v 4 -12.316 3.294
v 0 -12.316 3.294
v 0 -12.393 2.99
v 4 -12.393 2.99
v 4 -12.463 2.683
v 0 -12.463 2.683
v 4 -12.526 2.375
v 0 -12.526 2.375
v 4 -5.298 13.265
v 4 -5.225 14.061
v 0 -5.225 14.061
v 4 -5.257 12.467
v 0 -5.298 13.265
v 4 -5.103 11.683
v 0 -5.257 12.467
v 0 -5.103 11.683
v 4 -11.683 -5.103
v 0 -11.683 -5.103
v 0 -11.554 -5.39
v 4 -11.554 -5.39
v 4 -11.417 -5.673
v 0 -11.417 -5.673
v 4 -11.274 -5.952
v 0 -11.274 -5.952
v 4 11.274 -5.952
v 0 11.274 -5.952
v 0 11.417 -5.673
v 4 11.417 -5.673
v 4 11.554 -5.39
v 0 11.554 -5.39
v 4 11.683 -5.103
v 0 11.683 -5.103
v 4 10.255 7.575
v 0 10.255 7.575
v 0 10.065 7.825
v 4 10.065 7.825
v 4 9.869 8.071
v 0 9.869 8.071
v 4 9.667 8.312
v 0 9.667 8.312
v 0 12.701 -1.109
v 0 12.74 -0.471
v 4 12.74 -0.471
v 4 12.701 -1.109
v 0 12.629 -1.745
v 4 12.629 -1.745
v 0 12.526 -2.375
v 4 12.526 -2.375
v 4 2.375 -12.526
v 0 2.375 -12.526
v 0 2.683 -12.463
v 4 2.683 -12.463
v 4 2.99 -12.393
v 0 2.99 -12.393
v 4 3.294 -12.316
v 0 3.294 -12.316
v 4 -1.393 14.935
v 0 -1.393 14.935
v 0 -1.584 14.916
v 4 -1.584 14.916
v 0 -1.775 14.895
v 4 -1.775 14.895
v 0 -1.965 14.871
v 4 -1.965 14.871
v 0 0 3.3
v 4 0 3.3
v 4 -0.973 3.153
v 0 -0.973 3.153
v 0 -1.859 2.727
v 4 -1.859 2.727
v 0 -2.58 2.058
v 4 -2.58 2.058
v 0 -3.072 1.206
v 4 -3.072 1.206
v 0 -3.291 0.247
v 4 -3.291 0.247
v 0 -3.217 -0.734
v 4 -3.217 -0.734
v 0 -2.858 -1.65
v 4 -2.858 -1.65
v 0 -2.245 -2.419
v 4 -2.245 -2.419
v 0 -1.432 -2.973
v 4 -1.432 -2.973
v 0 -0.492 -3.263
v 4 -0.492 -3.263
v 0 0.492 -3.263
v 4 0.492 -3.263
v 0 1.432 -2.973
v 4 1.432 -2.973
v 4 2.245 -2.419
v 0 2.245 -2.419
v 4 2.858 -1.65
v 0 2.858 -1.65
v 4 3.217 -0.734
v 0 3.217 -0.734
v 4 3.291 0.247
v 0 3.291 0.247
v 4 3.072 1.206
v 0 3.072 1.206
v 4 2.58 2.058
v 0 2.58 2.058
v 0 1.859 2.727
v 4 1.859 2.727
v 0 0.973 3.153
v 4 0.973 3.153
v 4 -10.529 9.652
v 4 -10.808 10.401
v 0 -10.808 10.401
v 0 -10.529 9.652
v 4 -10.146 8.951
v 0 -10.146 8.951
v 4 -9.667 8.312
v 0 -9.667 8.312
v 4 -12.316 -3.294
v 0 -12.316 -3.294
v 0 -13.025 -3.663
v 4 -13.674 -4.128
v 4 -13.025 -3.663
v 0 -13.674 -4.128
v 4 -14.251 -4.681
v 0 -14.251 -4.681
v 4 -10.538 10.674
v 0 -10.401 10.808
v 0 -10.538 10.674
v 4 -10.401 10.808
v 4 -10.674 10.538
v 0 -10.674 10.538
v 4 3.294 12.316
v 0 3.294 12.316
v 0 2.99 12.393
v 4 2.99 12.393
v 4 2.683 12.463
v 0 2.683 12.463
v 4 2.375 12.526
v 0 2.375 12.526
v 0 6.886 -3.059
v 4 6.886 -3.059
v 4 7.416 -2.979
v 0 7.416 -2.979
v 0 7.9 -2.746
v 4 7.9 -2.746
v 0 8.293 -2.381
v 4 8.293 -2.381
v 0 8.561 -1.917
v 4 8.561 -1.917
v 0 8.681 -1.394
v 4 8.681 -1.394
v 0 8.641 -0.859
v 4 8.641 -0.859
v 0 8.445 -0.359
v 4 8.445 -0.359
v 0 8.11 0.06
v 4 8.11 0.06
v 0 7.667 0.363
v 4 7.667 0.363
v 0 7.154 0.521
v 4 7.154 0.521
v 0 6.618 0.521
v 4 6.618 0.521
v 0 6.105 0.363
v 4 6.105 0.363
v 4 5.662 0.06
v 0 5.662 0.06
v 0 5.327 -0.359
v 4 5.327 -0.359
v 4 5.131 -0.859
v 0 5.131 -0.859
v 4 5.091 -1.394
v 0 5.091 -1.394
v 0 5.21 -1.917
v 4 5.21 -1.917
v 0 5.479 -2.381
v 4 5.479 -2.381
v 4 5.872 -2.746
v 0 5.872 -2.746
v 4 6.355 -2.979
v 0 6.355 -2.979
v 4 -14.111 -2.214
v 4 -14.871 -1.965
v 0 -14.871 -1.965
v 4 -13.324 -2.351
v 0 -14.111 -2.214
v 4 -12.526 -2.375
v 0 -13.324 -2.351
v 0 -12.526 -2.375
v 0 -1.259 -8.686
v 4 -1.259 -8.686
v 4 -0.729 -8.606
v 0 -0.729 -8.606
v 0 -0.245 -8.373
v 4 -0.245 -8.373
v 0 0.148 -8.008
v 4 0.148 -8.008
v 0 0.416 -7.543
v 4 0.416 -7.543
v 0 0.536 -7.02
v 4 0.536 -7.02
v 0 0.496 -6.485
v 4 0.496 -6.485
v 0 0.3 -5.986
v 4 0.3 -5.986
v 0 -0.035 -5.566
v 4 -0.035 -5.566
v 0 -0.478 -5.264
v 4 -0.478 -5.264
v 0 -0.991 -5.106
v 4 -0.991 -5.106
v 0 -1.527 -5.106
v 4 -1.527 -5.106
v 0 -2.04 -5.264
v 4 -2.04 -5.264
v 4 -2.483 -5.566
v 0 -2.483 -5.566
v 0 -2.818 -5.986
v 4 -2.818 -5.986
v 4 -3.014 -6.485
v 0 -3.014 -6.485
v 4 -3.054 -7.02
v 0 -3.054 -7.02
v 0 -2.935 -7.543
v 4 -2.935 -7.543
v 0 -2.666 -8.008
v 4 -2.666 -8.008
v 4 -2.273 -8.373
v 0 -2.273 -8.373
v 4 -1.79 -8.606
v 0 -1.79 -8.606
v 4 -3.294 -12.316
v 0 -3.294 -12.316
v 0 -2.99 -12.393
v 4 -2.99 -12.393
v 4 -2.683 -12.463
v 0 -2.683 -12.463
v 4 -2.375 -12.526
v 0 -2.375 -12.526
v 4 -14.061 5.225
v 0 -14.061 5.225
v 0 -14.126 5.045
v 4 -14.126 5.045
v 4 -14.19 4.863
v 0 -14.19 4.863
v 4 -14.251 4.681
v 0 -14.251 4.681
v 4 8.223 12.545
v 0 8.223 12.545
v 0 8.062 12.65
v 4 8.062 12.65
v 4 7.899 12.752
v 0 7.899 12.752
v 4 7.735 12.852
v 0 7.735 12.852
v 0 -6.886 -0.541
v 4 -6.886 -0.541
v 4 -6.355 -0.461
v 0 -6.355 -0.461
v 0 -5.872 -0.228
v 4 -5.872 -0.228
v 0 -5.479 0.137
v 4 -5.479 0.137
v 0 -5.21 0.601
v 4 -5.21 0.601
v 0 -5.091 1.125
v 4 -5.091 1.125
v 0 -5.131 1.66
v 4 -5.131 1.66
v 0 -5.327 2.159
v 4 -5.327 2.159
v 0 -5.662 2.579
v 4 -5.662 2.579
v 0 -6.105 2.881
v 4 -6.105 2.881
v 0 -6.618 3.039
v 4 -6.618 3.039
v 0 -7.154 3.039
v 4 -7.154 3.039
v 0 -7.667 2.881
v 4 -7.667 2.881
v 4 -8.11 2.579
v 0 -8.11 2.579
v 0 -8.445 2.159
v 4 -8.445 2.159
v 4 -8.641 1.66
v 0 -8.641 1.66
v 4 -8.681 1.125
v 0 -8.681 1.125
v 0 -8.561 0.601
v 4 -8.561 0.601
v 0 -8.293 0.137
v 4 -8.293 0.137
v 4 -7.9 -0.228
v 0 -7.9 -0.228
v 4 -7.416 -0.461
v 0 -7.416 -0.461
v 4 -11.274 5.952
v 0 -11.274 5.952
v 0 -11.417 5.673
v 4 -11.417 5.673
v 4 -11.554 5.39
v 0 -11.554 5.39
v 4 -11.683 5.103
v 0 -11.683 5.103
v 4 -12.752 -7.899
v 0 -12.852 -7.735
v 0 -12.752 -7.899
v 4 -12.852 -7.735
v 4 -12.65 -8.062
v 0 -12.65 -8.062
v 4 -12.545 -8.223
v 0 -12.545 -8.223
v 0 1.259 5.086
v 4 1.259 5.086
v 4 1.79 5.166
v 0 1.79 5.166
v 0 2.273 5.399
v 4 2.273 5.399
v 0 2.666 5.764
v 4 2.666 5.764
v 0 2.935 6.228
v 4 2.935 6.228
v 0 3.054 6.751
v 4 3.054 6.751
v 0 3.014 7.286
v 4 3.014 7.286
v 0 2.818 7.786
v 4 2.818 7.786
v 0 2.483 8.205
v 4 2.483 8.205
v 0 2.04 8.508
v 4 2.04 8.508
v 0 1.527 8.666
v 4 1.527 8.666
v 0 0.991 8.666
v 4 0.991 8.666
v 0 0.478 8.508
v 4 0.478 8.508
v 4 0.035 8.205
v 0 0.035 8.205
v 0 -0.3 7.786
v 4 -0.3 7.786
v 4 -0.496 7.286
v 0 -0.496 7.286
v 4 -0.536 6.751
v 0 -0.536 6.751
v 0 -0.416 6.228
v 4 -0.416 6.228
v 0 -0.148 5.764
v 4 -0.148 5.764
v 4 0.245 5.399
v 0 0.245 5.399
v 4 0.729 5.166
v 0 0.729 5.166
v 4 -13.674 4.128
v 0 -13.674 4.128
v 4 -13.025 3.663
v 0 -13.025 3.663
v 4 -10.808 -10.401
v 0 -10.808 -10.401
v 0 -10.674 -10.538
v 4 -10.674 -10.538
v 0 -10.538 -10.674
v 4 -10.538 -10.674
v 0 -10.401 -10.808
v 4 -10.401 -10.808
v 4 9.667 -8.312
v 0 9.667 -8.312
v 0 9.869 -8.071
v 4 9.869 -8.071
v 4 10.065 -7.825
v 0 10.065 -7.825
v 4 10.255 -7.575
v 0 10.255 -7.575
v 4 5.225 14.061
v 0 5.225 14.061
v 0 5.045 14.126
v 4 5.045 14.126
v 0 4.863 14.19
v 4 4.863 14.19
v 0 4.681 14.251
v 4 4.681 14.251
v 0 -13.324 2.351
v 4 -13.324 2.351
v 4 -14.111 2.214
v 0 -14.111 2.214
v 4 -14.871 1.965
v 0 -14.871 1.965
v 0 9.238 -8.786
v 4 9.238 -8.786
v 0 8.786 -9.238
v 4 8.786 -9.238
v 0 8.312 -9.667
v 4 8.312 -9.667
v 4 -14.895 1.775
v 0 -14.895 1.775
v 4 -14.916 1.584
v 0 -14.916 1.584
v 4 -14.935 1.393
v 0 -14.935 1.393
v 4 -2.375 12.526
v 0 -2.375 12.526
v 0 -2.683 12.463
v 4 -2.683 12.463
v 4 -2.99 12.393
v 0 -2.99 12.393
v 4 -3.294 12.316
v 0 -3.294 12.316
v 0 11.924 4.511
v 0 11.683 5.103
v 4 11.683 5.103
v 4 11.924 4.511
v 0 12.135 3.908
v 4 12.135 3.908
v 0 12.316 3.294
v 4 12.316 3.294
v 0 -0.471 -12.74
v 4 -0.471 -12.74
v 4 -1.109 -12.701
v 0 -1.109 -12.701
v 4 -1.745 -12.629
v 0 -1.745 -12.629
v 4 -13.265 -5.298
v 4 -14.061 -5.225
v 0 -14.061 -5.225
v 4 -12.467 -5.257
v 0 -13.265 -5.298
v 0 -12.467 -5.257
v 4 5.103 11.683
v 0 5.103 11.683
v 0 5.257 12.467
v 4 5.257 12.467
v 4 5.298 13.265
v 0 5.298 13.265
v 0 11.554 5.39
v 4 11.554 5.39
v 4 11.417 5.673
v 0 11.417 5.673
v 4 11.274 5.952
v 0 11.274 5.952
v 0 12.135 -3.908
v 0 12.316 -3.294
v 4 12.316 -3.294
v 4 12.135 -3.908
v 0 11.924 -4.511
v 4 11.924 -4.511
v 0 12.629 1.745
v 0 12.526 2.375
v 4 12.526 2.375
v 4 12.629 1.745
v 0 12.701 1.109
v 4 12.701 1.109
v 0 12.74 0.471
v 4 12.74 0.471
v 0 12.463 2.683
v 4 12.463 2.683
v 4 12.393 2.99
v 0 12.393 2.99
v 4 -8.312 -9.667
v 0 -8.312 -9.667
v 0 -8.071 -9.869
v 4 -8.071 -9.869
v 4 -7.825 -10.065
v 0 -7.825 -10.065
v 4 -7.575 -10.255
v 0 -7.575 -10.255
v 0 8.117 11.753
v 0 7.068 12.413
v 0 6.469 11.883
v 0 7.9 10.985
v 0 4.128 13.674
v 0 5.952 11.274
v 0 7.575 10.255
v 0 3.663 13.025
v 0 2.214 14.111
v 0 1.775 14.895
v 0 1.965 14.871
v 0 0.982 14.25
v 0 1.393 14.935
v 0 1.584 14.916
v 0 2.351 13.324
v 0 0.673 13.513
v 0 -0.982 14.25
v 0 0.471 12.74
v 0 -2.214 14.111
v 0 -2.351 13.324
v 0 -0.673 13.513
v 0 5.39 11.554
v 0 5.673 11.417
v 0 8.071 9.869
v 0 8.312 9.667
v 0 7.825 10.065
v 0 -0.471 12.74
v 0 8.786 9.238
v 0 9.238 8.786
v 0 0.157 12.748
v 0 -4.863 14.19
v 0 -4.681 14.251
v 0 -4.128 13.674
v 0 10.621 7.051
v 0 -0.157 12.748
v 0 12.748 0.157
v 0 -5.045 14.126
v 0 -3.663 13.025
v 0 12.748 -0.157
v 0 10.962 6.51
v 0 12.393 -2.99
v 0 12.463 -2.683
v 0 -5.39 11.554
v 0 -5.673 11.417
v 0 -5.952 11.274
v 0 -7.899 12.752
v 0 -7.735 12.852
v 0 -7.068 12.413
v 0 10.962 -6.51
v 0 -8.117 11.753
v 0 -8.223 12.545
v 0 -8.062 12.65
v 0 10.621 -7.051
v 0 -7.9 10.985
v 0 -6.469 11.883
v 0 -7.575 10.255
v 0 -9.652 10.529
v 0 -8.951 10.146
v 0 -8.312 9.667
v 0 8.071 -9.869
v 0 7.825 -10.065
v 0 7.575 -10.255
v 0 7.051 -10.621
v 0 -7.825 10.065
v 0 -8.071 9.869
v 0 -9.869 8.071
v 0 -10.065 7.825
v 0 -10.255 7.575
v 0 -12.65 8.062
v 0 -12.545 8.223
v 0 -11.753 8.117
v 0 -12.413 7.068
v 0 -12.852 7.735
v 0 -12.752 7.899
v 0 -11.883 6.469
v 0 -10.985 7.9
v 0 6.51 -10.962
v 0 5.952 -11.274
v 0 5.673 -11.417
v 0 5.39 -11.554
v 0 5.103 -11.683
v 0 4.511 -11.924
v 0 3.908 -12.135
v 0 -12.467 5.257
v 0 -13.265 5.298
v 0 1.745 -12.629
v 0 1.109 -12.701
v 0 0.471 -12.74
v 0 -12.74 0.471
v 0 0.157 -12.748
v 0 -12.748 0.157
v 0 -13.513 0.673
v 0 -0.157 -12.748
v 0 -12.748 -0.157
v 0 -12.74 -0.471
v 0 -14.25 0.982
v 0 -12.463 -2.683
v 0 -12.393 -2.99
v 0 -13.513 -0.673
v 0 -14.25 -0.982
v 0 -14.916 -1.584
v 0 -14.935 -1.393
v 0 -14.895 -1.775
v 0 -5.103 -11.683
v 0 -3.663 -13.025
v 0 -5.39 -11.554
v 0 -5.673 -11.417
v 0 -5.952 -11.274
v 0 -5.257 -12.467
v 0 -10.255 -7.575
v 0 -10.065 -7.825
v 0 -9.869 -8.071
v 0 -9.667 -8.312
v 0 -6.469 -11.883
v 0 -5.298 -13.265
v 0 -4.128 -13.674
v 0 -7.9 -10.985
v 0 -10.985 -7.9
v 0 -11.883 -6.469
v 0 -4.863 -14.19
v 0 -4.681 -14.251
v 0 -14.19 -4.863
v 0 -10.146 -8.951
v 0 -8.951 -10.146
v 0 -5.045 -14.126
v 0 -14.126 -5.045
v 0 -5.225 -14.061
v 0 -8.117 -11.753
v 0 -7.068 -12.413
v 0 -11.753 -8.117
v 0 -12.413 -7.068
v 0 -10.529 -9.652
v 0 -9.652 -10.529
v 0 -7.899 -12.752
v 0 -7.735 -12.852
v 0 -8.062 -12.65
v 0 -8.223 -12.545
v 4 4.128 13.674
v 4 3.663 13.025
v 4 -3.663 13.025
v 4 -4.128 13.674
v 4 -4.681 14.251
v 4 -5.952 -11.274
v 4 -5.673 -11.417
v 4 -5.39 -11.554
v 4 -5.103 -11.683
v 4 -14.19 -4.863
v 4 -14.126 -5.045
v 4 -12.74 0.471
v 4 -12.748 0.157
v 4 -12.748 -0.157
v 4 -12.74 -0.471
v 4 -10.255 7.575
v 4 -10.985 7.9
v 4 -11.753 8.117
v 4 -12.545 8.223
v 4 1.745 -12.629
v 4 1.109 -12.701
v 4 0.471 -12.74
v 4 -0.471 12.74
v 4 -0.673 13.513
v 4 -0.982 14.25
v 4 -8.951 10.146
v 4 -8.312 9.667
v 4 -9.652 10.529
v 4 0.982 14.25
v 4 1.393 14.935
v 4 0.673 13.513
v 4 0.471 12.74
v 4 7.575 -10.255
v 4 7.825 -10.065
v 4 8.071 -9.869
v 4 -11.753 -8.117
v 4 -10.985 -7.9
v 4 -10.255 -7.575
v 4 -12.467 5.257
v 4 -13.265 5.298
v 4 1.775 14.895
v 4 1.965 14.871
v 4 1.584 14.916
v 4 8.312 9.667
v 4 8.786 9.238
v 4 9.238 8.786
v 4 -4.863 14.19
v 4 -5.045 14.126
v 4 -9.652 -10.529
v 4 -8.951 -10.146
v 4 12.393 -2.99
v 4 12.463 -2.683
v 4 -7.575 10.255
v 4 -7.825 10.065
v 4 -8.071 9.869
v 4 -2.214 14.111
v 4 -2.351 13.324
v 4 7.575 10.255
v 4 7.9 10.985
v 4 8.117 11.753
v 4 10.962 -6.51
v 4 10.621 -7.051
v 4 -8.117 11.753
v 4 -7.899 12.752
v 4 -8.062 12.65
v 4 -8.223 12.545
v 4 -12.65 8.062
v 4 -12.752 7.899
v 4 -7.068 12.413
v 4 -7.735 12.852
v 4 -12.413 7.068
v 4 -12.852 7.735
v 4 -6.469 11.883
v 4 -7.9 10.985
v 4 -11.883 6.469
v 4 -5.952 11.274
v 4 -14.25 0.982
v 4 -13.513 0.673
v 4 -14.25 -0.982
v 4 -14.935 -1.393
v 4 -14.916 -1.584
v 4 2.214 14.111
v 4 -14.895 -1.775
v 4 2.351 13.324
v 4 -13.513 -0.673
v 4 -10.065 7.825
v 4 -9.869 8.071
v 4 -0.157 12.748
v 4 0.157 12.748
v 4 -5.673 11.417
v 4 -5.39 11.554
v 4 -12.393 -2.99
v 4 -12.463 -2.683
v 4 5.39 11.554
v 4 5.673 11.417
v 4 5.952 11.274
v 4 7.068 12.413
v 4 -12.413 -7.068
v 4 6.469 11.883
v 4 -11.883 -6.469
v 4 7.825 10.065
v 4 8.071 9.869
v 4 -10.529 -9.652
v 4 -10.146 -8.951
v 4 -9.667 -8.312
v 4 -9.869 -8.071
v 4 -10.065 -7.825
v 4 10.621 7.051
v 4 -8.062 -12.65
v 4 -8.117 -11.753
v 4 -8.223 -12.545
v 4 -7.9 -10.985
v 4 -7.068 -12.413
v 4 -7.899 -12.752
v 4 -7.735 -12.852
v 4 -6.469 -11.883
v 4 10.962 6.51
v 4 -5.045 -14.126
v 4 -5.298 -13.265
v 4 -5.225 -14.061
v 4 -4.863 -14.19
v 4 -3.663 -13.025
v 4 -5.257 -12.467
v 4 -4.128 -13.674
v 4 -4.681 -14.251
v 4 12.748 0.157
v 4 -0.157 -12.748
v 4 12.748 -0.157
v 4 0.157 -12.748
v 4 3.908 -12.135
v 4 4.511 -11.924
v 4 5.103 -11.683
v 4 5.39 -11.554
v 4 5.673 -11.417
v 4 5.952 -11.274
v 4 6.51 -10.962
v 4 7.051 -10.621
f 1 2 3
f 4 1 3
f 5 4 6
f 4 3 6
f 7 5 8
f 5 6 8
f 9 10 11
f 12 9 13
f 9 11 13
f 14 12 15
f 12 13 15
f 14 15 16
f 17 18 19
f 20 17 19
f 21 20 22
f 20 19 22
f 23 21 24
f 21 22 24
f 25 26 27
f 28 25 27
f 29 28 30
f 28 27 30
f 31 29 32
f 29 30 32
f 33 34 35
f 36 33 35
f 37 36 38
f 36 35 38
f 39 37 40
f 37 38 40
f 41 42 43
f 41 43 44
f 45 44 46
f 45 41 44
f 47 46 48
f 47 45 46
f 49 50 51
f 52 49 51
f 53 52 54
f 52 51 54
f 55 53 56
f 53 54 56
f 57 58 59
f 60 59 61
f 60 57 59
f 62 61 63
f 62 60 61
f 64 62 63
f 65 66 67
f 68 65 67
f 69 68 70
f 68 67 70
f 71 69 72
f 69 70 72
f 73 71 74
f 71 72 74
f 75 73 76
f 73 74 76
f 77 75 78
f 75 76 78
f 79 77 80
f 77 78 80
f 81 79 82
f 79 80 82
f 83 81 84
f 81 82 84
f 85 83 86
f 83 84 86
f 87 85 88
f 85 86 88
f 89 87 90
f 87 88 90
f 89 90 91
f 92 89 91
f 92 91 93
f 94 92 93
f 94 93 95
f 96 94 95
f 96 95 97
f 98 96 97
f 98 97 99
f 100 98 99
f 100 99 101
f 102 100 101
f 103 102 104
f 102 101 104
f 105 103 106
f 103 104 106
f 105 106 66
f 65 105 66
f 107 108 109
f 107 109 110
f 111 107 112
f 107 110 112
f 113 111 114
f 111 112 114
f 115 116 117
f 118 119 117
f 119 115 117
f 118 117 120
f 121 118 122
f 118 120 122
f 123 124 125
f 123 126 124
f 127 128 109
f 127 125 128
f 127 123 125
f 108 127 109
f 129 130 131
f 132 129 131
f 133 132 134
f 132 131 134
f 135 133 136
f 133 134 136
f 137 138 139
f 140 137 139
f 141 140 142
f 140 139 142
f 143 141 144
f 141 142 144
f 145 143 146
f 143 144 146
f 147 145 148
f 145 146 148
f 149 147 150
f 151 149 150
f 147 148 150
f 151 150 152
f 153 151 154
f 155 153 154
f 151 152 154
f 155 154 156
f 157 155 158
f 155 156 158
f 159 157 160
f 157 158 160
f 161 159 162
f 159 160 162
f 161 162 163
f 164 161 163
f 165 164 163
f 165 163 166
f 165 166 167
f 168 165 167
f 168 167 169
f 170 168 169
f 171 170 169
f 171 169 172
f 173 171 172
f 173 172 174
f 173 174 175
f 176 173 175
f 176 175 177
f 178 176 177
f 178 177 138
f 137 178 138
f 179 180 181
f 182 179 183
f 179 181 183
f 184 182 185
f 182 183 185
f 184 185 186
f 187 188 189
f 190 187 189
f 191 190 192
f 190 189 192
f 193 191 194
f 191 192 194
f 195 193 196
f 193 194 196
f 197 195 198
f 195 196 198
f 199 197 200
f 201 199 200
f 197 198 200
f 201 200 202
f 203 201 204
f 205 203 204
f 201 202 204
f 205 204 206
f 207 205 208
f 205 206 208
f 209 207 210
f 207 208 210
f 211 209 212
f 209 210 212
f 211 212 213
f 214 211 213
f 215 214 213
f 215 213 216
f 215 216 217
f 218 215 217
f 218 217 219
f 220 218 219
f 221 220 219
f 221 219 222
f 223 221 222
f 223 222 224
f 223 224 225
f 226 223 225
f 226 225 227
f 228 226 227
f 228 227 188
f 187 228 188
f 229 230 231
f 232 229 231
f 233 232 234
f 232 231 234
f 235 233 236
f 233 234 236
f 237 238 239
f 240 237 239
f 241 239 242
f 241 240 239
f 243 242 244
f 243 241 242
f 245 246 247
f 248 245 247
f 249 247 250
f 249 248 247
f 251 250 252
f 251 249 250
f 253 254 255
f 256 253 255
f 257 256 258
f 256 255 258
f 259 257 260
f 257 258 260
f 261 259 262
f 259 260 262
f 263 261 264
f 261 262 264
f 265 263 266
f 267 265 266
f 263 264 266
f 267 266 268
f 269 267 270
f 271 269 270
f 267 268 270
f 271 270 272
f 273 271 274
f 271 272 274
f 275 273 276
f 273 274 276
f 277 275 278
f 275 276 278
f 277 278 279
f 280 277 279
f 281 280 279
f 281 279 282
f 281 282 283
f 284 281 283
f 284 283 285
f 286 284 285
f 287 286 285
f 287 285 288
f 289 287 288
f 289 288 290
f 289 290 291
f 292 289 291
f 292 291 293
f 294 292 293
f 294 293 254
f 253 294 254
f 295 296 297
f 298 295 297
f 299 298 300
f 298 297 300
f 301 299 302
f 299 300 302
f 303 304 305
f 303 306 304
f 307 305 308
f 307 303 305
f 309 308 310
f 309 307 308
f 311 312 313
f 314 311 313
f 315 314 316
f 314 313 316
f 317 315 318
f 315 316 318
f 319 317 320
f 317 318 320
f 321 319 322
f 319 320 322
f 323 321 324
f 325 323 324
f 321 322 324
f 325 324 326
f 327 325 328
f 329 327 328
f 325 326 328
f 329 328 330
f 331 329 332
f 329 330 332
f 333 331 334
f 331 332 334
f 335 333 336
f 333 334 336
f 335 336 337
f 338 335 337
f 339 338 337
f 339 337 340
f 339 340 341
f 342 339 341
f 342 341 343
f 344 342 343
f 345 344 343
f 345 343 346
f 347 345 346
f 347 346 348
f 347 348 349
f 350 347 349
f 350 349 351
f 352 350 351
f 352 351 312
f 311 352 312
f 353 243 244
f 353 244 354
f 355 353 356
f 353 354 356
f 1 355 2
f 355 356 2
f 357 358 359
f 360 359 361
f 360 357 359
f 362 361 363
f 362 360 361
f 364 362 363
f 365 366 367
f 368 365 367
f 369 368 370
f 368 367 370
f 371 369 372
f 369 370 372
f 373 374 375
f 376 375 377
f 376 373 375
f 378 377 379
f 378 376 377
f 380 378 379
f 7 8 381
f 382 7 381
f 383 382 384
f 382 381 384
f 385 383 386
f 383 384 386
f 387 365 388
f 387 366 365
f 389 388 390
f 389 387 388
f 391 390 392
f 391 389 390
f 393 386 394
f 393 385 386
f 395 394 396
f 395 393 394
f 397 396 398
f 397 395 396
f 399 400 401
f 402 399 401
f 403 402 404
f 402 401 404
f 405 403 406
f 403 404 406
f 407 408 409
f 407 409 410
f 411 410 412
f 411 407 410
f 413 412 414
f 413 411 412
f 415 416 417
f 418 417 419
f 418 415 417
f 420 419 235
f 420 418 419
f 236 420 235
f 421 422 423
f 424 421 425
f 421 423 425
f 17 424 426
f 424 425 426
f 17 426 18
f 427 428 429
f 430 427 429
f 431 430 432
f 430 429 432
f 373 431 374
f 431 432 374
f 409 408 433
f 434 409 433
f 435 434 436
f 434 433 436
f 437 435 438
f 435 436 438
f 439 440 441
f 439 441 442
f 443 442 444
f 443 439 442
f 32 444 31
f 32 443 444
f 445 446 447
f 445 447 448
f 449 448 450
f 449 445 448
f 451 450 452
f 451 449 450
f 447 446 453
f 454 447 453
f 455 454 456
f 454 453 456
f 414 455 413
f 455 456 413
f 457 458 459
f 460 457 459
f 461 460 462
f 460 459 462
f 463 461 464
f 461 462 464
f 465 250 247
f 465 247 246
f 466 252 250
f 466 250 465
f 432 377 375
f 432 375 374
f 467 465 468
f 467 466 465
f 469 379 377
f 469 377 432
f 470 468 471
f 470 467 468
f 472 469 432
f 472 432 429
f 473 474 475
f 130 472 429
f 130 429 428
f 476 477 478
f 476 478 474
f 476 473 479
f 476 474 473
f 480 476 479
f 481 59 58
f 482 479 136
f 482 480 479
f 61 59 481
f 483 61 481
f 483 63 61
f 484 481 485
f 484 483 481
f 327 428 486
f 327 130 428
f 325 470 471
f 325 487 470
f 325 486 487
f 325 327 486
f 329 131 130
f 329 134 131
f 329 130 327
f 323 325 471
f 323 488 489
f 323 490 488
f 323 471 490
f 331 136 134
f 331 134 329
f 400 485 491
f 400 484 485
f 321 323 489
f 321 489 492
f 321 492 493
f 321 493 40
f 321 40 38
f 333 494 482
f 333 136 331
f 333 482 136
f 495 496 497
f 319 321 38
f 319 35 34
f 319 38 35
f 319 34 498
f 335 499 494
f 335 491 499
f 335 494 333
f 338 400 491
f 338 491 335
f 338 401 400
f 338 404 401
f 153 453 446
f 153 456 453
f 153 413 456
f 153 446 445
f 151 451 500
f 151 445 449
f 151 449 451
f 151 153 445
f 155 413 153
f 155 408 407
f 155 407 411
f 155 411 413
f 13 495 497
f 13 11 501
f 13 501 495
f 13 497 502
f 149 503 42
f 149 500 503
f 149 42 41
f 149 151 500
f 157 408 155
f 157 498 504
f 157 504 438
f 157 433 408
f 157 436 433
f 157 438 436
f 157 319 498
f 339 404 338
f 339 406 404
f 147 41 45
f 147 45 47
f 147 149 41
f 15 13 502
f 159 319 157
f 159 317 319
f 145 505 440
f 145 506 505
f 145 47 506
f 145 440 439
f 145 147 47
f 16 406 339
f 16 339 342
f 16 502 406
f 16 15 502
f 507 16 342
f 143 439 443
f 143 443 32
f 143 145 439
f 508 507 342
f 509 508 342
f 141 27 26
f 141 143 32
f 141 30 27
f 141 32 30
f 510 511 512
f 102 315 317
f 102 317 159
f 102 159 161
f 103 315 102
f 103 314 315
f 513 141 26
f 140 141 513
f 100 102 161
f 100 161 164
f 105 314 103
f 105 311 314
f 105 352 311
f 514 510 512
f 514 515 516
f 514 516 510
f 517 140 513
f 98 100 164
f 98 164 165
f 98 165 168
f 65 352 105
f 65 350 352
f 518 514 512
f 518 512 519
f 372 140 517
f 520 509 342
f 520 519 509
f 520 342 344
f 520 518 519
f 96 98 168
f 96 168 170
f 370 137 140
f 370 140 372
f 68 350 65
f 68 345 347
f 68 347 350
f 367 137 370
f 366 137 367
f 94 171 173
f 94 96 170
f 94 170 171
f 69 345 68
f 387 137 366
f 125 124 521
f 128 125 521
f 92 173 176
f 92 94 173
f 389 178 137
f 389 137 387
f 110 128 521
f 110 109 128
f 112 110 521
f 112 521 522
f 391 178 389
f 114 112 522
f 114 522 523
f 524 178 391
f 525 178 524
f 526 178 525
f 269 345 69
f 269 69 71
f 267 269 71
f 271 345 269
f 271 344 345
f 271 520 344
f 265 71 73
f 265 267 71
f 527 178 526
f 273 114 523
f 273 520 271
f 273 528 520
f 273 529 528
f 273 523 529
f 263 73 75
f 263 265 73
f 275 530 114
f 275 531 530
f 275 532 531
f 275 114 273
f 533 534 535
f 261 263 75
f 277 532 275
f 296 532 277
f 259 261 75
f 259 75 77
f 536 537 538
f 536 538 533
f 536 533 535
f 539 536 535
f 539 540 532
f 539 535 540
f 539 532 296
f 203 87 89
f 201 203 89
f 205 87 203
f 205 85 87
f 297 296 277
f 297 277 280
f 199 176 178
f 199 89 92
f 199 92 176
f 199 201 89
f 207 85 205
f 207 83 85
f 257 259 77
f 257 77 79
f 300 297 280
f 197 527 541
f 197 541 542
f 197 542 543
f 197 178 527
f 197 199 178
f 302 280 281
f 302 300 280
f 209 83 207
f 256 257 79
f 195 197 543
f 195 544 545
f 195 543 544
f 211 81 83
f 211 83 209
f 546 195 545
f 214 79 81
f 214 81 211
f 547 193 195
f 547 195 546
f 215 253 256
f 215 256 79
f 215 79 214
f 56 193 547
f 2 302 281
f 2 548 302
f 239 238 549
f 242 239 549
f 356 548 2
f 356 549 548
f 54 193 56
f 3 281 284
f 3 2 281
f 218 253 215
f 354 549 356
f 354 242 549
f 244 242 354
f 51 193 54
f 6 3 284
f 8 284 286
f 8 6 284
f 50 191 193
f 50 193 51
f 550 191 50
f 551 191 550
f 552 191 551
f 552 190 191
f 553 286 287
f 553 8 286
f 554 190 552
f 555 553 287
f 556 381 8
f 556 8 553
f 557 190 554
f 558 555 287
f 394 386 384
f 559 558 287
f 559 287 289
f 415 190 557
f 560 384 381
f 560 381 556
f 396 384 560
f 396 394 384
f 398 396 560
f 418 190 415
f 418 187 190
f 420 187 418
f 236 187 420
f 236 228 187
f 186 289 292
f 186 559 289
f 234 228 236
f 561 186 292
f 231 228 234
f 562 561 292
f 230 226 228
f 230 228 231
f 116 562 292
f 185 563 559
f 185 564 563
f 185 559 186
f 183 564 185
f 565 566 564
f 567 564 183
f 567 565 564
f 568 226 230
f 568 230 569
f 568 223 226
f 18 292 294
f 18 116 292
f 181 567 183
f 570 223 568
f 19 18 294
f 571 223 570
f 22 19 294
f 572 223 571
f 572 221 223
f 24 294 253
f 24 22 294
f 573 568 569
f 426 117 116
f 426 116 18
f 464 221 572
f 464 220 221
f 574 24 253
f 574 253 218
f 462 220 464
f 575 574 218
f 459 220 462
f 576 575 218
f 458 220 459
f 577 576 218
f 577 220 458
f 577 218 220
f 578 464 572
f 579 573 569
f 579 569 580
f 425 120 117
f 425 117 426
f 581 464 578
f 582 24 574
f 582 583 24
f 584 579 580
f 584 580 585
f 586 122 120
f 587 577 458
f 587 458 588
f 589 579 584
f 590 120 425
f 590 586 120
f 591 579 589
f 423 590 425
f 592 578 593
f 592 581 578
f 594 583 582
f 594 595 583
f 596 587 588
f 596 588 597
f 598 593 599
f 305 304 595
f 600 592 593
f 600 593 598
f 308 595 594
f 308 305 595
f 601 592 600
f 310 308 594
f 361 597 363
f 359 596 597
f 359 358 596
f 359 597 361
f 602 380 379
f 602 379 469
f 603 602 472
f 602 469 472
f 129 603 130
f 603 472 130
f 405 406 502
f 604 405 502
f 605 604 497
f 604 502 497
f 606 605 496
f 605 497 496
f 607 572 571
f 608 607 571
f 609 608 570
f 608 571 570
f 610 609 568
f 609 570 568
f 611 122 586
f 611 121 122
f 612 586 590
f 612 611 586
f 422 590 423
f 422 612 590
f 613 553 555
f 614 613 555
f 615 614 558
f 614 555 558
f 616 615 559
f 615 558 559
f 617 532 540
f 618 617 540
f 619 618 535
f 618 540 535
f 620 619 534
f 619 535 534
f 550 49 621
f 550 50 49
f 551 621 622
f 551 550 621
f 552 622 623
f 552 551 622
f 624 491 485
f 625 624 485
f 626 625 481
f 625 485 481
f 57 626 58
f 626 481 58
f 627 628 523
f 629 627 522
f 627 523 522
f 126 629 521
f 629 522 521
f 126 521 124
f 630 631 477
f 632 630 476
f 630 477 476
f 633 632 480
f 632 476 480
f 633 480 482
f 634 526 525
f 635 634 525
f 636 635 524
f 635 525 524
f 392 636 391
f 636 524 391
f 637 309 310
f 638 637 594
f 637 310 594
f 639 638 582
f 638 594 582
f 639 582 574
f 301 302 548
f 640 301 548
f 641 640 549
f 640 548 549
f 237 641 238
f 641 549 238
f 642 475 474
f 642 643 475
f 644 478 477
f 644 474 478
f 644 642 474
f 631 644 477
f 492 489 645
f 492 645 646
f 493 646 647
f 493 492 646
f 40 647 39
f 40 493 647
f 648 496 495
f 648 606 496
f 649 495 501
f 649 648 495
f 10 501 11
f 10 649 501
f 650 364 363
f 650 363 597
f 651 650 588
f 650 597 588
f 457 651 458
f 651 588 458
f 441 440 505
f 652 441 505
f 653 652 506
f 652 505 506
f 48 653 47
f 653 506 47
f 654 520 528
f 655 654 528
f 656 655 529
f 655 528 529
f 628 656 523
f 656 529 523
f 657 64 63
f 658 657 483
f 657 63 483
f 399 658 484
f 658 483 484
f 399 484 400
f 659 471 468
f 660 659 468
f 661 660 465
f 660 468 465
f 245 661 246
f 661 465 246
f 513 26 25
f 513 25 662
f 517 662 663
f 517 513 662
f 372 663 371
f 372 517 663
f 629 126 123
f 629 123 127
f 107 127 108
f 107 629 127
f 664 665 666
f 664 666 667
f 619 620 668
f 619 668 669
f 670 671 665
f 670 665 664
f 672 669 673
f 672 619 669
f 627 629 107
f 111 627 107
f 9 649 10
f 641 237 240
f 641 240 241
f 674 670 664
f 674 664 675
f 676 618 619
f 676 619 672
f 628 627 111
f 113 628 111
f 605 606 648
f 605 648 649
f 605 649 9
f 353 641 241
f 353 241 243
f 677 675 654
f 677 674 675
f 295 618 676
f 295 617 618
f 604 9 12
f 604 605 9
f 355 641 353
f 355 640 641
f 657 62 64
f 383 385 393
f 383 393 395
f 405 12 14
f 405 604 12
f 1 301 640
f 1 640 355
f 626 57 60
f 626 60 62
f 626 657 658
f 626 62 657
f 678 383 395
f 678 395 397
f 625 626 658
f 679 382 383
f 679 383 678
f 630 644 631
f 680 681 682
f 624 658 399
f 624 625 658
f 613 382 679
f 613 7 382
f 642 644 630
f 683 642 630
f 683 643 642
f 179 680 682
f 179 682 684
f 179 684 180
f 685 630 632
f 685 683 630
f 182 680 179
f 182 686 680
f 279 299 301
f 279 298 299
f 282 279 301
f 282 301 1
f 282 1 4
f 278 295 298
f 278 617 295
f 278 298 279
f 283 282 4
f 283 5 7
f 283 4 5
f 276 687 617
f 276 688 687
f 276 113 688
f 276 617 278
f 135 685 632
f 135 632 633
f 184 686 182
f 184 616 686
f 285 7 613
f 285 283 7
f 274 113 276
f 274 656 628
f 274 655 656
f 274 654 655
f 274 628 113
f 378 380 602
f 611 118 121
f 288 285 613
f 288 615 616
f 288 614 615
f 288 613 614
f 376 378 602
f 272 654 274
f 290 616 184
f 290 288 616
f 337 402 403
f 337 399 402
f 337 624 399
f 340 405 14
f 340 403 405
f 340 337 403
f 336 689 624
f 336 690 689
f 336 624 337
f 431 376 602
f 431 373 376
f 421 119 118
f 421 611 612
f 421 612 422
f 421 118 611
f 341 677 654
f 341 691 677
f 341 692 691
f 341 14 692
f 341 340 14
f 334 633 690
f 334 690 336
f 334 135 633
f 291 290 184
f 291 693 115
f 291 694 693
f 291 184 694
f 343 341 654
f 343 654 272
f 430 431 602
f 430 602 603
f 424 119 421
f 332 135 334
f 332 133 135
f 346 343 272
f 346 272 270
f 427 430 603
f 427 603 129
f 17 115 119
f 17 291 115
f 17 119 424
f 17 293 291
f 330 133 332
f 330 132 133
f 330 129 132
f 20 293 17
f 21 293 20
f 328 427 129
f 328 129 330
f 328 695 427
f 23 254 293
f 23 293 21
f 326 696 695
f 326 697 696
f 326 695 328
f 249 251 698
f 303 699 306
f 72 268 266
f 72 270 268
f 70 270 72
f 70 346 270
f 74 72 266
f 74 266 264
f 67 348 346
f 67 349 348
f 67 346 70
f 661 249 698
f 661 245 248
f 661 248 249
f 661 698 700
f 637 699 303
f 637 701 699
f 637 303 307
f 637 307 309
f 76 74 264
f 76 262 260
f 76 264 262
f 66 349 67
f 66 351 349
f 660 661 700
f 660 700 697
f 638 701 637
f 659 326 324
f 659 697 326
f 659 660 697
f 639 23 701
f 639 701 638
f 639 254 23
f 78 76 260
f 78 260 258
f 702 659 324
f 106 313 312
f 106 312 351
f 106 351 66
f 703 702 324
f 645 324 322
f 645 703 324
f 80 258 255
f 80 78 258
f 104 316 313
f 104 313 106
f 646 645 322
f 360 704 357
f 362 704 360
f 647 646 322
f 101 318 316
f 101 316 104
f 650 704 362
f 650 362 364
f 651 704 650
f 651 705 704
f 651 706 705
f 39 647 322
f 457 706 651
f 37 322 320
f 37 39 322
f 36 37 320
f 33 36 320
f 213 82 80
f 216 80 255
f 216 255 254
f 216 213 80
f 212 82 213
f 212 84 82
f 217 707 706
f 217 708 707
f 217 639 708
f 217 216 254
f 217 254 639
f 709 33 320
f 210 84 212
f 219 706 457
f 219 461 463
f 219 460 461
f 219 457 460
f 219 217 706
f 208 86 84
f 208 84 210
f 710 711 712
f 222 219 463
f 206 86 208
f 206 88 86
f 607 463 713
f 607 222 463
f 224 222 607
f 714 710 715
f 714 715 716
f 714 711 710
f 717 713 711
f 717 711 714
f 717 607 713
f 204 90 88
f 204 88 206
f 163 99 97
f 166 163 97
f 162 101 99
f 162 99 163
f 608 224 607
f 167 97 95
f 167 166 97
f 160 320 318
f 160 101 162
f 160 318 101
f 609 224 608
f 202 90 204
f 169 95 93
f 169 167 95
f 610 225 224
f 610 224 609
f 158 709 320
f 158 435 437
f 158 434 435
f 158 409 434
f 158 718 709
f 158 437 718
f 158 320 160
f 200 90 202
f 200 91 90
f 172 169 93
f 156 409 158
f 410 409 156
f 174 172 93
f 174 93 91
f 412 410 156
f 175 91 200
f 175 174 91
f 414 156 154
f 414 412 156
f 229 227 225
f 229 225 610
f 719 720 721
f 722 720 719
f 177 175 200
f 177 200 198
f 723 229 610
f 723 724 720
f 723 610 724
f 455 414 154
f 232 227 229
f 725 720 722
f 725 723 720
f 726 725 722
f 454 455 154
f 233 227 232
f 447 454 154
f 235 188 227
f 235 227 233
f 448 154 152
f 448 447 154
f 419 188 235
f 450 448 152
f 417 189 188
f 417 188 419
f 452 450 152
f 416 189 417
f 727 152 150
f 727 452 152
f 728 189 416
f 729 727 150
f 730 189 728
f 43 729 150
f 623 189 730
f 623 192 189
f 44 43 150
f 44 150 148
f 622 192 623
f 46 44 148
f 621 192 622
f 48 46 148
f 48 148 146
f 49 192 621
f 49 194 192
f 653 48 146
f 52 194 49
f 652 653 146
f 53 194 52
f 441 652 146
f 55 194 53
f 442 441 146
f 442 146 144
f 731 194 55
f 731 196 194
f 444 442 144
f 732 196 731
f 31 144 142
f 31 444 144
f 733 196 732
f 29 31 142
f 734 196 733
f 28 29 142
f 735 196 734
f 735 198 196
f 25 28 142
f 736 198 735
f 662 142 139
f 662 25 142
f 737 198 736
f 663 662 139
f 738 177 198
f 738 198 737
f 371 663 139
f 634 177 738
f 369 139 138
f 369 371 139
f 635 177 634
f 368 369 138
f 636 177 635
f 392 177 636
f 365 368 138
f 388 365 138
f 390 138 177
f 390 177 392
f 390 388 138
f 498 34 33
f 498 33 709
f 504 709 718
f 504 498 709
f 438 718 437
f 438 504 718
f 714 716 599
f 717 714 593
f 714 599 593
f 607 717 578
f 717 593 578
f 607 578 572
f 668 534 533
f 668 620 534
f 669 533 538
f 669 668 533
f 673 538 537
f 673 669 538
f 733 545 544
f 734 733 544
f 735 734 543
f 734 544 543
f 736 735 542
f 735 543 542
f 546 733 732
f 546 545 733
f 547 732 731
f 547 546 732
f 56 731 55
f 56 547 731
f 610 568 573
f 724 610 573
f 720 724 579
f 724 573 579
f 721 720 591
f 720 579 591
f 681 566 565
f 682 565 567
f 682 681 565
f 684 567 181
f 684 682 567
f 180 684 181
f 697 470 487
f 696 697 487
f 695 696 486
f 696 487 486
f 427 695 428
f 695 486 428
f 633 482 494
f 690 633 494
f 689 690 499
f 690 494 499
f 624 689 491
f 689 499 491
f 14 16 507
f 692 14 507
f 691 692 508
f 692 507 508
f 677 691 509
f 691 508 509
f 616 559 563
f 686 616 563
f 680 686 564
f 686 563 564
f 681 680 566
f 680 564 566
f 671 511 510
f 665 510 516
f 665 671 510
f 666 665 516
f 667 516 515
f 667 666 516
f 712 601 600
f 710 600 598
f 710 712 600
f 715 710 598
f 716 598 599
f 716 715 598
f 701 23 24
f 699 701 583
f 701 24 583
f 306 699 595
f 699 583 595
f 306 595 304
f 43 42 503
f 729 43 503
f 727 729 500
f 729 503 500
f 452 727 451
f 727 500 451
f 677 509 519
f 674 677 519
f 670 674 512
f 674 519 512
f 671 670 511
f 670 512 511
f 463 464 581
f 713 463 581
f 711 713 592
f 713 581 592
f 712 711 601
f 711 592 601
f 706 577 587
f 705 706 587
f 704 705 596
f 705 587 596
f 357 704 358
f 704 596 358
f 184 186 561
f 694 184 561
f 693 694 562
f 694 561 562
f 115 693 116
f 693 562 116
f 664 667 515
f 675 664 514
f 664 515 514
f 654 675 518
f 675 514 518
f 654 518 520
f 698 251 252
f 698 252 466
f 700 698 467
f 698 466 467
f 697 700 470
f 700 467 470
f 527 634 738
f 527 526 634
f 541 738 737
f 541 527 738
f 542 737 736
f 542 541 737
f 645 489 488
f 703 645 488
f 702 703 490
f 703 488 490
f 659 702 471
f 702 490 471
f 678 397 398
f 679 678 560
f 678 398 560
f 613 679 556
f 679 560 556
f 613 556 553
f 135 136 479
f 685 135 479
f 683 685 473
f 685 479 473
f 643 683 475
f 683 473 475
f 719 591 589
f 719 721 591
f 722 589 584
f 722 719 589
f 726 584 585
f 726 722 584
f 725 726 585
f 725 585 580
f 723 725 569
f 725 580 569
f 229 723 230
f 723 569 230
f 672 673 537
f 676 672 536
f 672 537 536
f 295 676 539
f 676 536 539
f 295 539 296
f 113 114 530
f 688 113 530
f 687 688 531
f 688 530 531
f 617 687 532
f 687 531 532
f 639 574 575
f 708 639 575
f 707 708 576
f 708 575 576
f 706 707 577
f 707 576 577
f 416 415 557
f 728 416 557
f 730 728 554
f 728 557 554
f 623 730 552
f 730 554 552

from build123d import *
from build123d.topology import SkipClean

# Parameters (mm, degrees)
BASPROSKE_W         = 10
BASPROSKE_H         = 15
TOOTHCUT_DEPTH      = 24.452078799
TEETHCUTS_COUNT     = 28
TEETHCUTS_ANGLE     = 347.142857143
BORSKE_R            = 3.3
BORE_DEPTH          = 50.0000508
SKETCH_1_R          = 15
CUT_EXTRUDE_1_DEPTH = 6
CUT_EXTRUDE_2_DEPTH = 10
SKETCH_3_R          = 1.8
CUT_EXTRUDE_3_DEPTH = 10


with BuildPart() as part:
    # BasProSke → Base-Revolve (revolve)
    with BuildSketch(Plane(origin=(0, 0, 0), x_dir=(1, 0, 0), z_dir=(0, 1, 0)), mode=Mode.PRIVATE) as base_revolve_sk:
        with Locations((5, 7.5)):
            Rectangle(BASPROSKE_W, BASPROSKE_H)
    revolve(base_revolve_sk.sketch.rotate(Axis((-10, 0, 0), (1, 0, 0)), 180), axis=Axis((-10, 0, 0), (1, 0, 0)))

    # TooCutSke → ToothCut (cut, through all)
    with BuildSketch(Plane(origin=(0, 0, 0), x_dir=(0, 0, -1), z_dir=(1, 0, 0))):
        with BuildLine():
            ThreePointArc((0.471336039, 12.740284272), (0, 12.749), (-0.471336039, 12.740284272))
            ThreePointArc((-0.471336039, 12.740284272), (-0.81983923, 13.900763331), (-1.409805137, 14.959114099))
            ThreePointArc((-1.409805137, 14.959114099), (0, 15.0254), (1.409805137, 14.959114099))
            ThreePointArc((1.409805137, 14.959114099), (0.81983923, 13.900763331), (0.471336039, 12.740284272))
        make_face()
    toothcut = extrude(amount=TOOTHCUT_DEPTH, mode=Mode.SUBTRACT)

    # TeethCuts: ToothCut ×28 about axis
    teethcuts_axis = Axis((-10, 0, 0), (1, 0, 0))
    for i in range(1, TEETHCUTS_COUNT):
        add(toothcut.rotate(teethcuts_axis, i * TEETHCUTS_ANGLE / (TEETHCUTS_COUNT - 1)), mode=Mode.SUBTRACT)

    # BorSke → Bore (cut, symmetric)
    with BuildSketch(Plane(origin=(0, 0, 0), x_dir=(0, 0, -1), z_dir=(1, 0, 0))):
        with Locations(Location((0, 0, 0), (0, 0, 180))):
            Circle(BORSKE_R)
    extrude(amount=BORE_DEPTH, both=True, mode=Mode.SUBTRACT)

    # ｽｹｯﾁ1 → ｶｯﾄ - 押し出し1 (cut)
    with BuildSketch(Plane(origin=(10, 0, 0), x_dir=(0, 0, -1), z_dir=(1, 0, 0))):
        Circle(SKETCH_1_R)
    extrude(amount=-CUT_EXTRUDE_1_DEPTH, mode=Mode.SUBTRACT)

    # ｽｹｯﾁ2 → ｶｯﾄ - 押し出し2 (cut)
    with SkipClean():  # the faces are left unmerged after this step: merging them gives an invalid solid
        with BuildSketch(Plane.ZY):
            with BuildLine():
                Line((-12.525740882, -2.375461295), (-14.737321612, -2.794879553))
                ThreePointArc((-14.737321612, -2.794879553), (-6.004168657, 13.745906981), (12.065215177, 8.912383672))
                Line((12.065215177, 8.912383672), (10.254628553, 7.574931963))
                ThreePointArc((10.254628553, 7.574931963), (-5.10314308, 11.68310454), (-12.525740882, -2.375461295))
            make_face()
        extrude(amount=-CUT_EXTRUDE_2_DEPTH, mode=Mode.SUBTRACT)

    # ｽｹｯﾁ3 → ｶｯﾄ - 押し出し3 (cut)
    with SkipClean():  # the faces are left unmerged after this step: merging them gives an invalid solid
        with BuildSketch(Plane(origin=(4, 0, 0), x_dir=(0, 0, -1), z_dir=(1, 0, 0))):
            with Locations((-6.885831114, 1.259098832)):
                Circle(SKETCH_3_R)
            with Locations((1.259098832, 6.885831114)):
                Circle(SKETCH_3_R)
            with Locations((6.885831114, -1.259098832)):
                Circle(SKETCH_3_R)
            with Locations((-1.259098832, -6.885831114)):
                Circle(SKETCH_3_R)
        extrude(amount=-CUT_EXTRUDE_3_DEPTH, mode=Mode.SUBTRACT)


solid = part.part
